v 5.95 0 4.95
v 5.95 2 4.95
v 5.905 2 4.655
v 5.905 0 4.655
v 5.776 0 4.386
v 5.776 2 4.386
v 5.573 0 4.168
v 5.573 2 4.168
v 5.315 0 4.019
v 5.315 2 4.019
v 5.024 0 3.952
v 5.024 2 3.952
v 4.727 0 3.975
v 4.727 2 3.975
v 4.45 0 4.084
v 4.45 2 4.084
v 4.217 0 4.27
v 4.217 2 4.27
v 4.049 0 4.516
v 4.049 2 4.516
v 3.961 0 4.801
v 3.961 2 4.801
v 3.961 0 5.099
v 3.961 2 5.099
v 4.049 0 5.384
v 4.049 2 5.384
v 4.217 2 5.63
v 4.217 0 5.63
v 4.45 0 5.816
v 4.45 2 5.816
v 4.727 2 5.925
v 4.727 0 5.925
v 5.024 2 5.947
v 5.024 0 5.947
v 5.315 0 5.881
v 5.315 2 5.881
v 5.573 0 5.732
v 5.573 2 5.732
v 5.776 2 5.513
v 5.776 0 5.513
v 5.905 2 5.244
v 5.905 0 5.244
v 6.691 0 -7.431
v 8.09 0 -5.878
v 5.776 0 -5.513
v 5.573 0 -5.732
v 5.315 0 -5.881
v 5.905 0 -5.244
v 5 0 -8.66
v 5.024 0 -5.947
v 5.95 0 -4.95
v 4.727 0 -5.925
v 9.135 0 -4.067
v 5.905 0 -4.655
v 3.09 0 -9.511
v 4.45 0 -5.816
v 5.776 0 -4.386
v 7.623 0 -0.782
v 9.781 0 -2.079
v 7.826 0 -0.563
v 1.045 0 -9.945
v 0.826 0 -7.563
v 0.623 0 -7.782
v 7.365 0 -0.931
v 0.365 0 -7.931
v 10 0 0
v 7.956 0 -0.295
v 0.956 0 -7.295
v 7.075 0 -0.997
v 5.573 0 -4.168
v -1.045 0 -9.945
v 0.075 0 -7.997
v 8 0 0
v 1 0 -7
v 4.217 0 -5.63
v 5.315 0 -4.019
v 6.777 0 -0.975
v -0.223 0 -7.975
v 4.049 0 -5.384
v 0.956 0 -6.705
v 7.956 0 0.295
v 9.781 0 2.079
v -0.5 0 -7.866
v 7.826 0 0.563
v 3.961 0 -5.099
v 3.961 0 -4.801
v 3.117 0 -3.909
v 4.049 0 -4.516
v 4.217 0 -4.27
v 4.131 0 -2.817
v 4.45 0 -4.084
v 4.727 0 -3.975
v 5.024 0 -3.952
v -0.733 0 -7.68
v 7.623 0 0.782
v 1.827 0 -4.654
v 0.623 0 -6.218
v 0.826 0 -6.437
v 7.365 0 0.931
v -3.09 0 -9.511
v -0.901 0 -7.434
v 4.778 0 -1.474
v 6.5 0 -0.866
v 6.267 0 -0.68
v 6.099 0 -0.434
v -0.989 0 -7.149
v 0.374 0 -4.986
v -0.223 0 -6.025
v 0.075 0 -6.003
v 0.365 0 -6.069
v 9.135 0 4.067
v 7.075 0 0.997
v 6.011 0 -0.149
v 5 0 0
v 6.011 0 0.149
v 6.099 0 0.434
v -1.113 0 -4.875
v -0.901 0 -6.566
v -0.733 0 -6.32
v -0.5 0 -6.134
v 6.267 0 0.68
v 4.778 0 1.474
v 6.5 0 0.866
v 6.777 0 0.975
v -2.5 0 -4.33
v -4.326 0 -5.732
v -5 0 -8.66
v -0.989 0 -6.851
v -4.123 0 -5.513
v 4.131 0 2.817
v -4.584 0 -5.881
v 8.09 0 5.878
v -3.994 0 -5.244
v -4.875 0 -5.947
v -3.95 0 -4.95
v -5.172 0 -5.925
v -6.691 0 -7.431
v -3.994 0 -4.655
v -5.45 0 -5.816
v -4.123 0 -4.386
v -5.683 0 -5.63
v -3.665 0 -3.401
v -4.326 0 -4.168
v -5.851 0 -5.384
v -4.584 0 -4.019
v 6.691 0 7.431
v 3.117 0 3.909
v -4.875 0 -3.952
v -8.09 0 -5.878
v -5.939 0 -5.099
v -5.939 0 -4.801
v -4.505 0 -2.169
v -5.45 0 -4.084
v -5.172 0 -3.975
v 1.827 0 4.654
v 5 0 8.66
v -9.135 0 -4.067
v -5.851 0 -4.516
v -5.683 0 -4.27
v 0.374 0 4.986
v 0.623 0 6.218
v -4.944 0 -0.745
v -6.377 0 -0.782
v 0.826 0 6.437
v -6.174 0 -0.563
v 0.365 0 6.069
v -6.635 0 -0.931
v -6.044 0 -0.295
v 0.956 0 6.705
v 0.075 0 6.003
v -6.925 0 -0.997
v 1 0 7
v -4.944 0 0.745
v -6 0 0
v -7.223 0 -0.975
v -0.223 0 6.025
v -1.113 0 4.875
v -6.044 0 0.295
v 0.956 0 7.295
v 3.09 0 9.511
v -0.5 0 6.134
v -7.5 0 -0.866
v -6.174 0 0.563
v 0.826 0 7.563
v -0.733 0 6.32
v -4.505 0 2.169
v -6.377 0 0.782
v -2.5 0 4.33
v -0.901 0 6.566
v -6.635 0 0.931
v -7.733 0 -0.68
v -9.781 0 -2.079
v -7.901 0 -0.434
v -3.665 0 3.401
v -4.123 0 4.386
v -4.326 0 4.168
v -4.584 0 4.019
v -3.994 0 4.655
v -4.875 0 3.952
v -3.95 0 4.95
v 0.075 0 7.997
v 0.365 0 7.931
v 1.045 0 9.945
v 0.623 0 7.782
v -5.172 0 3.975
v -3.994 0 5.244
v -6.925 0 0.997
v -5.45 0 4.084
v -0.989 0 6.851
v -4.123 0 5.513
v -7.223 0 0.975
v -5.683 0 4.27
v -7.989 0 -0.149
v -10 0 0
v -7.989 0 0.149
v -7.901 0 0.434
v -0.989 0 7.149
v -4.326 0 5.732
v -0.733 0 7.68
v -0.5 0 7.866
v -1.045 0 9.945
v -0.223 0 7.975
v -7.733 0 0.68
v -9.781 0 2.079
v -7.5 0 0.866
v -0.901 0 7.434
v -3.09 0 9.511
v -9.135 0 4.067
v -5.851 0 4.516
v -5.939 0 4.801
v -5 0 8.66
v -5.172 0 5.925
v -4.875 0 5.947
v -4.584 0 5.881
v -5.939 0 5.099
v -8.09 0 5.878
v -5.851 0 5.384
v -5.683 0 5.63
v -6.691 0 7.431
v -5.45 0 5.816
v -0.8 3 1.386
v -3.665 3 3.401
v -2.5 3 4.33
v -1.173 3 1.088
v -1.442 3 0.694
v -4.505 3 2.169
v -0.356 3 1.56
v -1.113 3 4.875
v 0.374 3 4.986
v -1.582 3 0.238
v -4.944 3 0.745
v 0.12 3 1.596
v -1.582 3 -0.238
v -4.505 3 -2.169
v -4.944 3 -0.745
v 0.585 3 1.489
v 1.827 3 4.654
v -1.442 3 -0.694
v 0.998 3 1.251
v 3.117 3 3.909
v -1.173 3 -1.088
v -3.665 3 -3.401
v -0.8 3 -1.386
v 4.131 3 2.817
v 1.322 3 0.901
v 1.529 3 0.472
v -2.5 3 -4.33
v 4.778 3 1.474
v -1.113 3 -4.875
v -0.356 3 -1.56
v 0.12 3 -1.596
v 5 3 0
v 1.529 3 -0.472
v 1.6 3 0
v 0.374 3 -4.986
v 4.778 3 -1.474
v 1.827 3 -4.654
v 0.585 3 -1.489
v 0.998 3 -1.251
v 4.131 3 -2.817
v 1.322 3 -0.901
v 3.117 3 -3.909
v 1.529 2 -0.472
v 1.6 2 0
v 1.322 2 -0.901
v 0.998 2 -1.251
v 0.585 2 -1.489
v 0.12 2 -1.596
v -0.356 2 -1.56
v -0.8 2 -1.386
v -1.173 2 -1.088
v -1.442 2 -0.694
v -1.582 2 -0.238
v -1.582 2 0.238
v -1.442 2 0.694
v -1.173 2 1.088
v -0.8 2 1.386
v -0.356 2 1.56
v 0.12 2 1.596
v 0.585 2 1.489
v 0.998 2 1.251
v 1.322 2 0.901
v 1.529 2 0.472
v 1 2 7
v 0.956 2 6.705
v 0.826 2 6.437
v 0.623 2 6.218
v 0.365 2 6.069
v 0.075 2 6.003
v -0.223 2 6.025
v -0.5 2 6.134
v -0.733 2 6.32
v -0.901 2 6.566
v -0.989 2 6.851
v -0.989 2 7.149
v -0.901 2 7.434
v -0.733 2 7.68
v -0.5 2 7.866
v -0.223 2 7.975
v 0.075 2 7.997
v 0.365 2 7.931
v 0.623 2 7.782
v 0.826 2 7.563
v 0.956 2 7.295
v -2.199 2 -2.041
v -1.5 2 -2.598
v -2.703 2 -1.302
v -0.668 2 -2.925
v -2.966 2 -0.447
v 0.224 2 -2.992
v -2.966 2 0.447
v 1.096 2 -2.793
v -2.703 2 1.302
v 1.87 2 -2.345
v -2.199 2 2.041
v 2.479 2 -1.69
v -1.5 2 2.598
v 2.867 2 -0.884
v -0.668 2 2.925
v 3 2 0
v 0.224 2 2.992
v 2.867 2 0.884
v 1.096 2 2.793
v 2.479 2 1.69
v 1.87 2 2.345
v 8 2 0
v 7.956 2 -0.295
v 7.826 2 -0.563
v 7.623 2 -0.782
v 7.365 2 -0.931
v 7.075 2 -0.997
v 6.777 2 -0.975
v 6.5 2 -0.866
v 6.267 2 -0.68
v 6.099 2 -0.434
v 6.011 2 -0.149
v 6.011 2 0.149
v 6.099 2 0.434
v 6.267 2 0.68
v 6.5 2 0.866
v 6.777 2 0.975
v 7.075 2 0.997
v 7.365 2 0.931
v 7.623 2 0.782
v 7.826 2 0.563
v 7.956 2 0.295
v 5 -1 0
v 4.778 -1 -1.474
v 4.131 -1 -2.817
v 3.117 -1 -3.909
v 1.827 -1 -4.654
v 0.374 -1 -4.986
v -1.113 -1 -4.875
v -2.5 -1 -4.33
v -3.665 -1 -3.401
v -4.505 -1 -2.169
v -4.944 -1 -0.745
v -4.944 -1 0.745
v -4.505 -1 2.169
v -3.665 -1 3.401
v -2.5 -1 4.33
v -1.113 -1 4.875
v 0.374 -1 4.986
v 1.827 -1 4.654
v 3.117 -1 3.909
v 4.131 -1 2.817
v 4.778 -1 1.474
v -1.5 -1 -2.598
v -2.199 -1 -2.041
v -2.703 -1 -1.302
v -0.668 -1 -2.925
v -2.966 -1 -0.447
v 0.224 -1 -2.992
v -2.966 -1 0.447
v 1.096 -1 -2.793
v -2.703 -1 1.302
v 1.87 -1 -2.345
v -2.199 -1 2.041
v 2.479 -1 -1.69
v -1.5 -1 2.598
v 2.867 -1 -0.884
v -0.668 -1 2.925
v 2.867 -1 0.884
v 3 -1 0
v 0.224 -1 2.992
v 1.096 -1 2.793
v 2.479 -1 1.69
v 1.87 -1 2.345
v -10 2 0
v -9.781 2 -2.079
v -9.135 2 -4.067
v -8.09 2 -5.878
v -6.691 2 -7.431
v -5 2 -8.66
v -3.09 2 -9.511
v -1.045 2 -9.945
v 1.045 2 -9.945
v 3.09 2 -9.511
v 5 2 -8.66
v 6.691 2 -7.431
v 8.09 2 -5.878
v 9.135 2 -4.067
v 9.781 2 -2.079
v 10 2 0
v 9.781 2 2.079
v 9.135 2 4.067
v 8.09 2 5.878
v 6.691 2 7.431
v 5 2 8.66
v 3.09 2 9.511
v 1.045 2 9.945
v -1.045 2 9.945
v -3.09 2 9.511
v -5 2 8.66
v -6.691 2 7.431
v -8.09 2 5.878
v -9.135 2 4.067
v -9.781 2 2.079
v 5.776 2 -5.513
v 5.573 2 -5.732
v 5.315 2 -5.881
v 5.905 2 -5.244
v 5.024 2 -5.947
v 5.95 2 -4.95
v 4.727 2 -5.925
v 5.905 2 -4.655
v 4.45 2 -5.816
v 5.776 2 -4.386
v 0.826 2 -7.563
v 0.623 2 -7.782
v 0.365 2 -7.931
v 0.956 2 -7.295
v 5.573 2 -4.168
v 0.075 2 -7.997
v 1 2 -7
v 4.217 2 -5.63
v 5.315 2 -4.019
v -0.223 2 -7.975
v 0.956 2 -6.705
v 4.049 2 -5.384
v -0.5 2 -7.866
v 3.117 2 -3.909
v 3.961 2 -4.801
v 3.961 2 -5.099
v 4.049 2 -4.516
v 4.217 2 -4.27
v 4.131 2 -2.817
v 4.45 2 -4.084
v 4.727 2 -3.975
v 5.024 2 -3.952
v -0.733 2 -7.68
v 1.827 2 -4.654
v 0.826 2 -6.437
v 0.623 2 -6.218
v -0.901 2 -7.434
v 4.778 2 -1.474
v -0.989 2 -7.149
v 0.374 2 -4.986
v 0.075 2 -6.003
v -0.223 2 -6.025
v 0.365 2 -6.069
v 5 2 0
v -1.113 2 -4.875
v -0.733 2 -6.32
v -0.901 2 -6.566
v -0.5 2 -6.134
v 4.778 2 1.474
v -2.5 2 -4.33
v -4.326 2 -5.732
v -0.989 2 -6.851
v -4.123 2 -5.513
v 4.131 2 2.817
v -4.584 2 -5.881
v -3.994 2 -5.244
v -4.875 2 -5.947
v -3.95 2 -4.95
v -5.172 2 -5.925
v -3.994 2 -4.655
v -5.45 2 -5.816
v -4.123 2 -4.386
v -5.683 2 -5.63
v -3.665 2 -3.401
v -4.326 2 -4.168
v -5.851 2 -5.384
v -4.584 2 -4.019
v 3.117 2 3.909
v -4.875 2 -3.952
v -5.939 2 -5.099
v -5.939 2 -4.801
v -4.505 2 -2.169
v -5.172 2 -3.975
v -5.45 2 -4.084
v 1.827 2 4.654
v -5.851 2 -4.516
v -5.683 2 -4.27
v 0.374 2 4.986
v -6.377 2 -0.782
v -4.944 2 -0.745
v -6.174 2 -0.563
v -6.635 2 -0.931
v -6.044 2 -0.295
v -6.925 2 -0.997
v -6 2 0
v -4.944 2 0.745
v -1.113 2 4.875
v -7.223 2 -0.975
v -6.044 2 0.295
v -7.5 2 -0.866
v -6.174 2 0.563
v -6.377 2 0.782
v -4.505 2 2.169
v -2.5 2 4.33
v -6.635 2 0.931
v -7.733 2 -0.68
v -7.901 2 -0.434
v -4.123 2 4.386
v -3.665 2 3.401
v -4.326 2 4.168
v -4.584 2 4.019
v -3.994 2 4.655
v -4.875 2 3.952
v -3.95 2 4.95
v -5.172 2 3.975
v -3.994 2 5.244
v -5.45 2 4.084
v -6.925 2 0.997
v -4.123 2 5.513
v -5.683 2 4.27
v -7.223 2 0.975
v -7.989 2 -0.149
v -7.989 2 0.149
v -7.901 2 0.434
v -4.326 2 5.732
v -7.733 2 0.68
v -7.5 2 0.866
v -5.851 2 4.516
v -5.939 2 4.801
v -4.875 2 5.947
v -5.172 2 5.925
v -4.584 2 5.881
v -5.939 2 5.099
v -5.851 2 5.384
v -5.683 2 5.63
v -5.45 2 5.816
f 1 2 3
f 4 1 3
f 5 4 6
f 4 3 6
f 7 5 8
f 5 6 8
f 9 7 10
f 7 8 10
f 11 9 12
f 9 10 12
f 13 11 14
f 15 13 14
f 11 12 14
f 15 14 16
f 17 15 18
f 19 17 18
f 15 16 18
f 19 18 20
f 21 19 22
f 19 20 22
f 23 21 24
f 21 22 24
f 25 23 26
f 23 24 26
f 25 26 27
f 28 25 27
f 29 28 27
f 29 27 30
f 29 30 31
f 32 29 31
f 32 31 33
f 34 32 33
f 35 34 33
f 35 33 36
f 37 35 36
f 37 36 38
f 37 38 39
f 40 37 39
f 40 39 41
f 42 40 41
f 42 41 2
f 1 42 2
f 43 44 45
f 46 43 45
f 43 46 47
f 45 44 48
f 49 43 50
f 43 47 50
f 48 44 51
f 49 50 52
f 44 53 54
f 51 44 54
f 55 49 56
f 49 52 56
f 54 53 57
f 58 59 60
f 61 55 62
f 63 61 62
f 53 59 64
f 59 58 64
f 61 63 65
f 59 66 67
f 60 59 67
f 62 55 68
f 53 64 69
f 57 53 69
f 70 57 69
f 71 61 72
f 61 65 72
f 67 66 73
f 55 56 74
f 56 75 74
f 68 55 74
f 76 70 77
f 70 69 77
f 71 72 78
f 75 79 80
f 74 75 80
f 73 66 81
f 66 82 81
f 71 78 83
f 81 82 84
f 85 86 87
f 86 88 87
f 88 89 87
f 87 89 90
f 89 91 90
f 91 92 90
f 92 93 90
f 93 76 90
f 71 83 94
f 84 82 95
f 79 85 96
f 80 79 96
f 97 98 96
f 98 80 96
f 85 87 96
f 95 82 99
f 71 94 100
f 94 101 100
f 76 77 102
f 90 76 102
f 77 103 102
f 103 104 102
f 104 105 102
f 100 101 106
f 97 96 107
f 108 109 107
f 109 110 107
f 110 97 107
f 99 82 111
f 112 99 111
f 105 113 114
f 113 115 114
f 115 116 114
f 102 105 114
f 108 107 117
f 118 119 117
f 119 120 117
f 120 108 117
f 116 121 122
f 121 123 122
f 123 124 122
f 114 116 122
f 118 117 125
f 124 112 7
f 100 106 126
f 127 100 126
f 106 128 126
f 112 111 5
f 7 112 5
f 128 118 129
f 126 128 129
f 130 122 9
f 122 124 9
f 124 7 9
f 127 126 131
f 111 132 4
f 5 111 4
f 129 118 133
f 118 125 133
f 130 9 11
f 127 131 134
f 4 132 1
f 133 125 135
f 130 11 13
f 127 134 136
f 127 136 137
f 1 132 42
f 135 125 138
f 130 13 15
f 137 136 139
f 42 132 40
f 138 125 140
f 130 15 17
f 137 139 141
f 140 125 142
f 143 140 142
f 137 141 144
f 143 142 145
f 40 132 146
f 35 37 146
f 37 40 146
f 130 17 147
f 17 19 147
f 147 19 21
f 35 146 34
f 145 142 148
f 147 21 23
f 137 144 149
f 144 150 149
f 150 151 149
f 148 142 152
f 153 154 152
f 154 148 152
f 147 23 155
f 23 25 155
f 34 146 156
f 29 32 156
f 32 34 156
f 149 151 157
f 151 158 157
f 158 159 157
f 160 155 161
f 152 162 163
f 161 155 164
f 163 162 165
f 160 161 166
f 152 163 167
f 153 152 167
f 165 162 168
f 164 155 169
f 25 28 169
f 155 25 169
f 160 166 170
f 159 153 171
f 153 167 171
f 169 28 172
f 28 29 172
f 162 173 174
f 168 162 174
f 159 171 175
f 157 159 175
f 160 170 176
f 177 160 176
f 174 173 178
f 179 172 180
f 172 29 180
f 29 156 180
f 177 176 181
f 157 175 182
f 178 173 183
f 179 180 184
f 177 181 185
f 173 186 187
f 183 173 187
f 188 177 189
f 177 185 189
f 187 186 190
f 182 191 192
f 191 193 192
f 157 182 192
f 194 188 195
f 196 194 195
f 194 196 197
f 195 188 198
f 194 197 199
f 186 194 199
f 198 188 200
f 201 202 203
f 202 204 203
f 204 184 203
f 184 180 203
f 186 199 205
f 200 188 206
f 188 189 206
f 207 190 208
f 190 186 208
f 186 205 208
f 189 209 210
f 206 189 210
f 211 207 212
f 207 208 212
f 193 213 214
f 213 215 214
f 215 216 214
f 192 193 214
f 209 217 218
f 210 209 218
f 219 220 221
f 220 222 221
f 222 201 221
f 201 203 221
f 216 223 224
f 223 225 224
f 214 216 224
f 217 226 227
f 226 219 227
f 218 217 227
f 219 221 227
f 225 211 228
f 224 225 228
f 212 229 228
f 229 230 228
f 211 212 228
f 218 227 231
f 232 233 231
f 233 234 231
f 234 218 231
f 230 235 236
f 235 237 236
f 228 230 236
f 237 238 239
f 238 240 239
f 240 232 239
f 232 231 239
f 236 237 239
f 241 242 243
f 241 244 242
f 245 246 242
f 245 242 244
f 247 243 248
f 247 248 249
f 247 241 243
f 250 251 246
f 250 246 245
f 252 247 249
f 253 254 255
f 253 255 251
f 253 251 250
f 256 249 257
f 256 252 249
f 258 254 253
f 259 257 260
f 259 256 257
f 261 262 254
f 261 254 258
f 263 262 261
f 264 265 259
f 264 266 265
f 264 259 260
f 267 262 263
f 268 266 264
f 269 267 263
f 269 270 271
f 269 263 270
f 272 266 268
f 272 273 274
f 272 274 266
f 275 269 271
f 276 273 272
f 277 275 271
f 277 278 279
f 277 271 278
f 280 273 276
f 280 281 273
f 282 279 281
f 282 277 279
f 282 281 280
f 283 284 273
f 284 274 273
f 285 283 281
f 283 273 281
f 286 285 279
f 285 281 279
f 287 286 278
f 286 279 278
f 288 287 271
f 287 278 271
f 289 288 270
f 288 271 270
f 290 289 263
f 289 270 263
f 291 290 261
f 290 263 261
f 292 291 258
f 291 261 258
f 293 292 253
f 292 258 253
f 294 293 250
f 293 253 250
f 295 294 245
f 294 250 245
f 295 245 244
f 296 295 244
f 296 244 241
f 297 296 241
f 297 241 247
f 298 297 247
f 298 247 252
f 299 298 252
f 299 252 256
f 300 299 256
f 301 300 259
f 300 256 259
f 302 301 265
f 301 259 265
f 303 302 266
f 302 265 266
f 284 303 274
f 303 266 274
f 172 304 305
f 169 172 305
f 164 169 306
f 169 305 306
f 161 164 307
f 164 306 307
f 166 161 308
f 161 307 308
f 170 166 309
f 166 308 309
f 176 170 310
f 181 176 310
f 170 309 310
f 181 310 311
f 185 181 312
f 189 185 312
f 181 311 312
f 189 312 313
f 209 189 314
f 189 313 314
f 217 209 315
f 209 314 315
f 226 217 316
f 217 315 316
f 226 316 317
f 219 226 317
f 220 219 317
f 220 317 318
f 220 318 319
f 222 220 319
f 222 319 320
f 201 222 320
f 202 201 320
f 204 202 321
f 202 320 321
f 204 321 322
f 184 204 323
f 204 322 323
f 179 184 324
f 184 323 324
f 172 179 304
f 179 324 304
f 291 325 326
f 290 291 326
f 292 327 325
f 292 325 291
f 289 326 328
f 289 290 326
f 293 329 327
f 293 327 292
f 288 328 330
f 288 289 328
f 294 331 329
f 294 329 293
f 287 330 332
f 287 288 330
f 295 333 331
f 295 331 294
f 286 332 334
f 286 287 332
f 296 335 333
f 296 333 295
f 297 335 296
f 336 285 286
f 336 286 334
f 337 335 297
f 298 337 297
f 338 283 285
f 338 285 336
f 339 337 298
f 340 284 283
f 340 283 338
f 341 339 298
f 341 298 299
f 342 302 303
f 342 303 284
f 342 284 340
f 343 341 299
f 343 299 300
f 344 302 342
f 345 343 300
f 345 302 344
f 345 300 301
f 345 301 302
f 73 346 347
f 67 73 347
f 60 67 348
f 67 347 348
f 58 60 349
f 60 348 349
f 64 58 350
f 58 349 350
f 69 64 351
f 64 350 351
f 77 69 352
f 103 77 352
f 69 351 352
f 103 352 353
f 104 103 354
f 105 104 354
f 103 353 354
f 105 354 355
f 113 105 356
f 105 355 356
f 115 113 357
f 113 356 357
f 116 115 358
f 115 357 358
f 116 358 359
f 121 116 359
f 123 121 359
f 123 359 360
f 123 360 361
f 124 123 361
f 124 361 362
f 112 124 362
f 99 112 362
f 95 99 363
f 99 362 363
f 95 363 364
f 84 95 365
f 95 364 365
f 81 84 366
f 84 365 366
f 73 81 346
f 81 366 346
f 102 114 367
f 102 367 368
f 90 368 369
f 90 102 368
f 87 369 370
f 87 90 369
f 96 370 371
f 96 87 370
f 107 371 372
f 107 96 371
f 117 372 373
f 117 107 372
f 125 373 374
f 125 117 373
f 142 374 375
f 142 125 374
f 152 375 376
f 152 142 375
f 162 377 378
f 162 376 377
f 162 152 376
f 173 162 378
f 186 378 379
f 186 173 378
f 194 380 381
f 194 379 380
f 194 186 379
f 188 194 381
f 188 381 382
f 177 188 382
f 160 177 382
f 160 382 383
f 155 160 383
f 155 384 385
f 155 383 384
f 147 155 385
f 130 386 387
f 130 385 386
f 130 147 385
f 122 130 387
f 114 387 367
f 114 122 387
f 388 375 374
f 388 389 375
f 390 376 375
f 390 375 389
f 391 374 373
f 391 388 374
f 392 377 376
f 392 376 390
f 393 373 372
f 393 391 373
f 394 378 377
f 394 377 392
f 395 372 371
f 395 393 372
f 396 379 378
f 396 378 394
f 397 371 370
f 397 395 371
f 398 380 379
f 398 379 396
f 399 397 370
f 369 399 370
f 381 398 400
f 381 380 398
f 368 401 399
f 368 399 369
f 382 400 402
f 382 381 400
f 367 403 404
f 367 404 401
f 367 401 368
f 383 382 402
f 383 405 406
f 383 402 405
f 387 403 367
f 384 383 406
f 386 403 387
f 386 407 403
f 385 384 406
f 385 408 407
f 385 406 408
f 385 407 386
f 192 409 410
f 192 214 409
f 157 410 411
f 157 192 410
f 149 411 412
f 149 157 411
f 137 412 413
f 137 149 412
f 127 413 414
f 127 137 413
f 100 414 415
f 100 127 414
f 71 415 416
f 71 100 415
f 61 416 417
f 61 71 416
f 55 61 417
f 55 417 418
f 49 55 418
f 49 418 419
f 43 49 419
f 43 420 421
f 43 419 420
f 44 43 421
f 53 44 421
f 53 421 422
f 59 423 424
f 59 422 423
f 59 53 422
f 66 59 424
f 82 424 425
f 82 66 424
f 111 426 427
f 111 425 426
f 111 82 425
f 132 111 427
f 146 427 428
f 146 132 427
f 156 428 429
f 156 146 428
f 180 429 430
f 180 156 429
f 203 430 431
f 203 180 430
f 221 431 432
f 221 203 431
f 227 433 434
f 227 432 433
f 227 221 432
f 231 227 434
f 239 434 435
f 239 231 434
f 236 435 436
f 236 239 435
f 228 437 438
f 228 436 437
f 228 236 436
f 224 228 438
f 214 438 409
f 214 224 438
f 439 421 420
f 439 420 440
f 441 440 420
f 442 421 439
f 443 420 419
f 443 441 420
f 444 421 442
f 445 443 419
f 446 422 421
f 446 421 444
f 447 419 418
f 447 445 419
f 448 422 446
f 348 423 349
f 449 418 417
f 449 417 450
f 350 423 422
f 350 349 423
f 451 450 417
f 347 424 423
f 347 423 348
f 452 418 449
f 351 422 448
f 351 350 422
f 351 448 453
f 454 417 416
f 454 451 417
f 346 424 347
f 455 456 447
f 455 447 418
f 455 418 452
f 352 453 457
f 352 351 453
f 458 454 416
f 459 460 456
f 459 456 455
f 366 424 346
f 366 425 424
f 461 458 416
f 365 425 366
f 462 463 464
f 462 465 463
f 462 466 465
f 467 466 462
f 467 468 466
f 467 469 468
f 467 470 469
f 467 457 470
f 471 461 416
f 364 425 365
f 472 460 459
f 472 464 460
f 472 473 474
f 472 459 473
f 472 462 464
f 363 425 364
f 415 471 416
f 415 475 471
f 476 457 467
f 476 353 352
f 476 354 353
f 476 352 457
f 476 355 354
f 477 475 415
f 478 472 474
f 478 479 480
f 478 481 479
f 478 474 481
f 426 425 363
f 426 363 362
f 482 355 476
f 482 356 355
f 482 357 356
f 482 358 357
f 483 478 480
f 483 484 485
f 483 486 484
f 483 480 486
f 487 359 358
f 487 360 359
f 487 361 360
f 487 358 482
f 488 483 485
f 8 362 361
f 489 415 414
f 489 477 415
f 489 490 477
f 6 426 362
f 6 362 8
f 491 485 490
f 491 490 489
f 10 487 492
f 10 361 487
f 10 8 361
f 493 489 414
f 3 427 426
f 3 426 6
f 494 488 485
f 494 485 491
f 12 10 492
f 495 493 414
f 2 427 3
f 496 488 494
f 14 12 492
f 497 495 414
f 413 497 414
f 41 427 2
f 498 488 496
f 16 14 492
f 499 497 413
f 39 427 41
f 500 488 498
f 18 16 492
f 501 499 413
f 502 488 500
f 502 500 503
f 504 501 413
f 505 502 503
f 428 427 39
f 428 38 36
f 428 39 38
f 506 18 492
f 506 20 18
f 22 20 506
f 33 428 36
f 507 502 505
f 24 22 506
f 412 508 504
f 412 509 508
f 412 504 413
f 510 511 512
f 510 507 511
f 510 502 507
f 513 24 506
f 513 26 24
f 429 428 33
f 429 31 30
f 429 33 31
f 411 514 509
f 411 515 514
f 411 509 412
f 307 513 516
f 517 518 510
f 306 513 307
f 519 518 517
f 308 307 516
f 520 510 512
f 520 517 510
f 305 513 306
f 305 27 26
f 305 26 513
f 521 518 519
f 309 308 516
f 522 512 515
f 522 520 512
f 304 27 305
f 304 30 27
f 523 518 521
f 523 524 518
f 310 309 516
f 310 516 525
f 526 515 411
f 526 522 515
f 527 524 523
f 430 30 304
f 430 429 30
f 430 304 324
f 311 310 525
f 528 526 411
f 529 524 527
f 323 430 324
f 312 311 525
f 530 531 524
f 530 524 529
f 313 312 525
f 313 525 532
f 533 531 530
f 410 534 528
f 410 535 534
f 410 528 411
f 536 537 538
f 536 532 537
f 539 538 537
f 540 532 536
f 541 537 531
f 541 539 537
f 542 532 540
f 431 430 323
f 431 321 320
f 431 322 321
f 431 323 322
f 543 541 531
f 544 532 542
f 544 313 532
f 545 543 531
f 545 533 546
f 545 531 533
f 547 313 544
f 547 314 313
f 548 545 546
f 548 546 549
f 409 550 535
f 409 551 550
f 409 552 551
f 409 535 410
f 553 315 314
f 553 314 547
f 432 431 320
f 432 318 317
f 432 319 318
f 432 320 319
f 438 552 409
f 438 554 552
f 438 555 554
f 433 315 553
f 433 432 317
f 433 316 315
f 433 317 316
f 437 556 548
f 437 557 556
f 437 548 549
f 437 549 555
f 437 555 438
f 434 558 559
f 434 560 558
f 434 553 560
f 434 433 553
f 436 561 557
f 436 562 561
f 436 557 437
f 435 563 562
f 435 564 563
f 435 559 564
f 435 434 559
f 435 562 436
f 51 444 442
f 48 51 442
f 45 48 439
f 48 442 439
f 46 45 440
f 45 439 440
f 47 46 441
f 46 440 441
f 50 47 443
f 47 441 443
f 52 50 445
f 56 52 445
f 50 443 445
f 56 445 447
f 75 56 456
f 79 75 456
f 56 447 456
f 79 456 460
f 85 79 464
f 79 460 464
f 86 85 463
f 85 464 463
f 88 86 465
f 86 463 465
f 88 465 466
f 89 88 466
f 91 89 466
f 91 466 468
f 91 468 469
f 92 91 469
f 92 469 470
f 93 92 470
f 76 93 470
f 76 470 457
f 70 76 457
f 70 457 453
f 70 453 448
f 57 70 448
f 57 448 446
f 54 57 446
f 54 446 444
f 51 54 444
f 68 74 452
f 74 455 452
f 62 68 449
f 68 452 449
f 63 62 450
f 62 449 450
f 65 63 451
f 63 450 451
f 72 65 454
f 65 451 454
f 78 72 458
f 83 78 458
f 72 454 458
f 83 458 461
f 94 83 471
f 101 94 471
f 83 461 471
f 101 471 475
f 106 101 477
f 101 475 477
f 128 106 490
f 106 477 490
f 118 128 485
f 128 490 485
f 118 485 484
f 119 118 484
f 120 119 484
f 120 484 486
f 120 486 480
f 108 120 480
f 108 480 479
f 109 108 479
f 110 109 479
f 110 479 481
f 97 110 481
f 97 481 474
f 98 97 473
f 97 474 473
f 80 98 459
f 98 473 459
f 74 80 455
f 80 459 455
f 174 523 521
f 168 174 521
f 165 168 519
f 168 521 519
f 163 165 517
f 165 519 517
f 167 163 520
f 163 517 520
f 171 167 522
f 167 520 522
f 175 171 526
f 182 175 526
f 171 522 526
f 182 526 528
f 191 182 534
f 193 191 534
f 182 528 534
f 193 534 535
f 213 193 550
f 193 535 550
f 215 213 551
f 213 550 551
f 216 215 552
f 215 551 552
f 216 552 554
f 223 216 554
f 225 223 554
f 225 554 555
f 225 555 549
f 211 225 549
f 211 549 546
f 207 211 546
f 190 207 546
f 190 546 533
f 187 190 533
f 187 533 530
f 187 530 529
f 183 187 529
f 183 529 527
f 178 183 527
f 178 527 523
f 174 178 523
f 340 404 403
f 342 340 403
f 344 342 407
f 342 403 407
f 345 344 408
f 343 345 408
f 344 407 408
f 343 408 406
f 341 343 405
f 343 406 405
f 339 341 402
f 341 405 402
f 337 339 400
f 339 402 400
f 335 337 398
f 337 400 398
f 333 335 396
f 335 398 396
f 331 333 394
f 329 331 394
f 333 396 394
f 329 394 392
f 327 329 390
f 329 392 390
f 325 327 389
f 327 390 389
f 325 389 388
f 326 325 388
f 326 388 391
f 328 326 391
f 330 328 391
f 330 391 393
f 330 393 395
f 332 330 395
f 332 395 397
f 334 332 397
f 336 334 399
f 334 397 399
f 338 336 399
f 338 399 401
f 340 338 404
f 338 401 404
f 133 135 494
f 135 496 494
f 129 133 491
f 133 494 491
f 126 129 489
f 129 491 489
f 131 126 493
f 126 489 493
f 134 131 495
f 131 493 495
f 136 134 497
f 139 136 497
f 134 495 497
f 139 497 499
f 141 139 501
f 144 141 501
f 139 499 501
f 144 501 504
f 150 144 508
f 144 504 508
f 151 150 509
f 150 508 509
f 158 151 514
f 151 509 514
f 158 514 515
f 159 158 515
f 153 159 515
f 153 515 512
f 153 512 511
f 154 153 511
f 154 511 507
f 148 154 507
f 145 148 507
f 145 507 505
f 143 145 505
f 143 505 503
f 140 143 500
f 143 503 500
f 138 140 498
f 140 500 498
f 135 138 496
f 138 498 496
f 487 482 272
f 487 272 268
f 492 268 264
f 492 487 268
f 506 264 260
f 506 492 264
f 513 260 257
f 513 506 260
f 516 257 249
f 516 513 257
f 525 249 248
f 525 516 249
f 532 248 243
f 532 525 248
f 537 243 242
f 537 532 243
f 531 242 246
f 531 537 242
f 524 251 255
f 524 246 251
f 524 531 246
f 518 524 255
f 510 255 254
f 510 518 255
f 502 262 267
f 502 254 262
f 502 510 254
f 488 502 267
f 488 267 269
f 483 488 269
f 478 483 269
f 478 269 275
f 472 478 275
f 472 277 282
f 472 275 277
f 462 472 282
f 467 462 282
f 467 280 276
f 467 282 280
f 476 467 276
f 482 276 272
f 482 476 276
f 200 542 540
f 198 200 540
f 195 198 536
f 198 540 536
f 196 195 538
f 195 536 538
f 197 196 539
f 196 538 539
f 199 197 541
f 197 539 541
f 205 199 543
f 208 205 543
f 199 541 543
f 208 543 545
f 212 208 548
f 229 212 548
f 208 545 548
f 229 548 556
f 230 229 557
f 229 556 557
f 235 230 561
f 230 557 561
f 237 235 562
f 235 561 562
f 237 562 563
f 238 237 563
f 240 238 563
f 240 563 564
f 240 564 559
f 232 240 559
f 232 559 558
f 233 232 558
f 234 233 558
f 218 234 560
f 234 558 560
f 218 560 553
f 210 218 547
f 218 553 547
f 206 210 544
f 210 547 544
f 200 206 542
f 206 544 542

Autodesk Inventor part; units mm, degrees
ref_plane "YZ Plane" through (0, 0, 0) normal (1, 0, 0) x (0, 1, 0)
ref_plane "XZ Plane" through (0, 0, 0) normal (0, 1, 0) x (-1, 0, 0)
ref_plane "XY Plane" through (0, 0, 0) normal (0, 0, 1) x (1, 0, 0)
sketch "スケッチ1" plane through (0, 0, 0) normal (0, 1, 0) x (-1, 0, 0)
  circle A0 centre (0, 0) radius 10
  dimension "d0" = 20
extrude "押し出し1" add sketch "スケッチ1" along normal blind 2
sketch "スケッチ2" plane through (0, 2, 0) normal (0, 1, 0) x (1, 0, 0)
  circle A0 centre (0, 0) radius 7 construction
  circle A1 centre (-7, 0) radius 1
  circle A2 centre (-4.9497, -4.9497) radius 1
  circle A3 centre (0, -7) radius 1
  circle A4 centre (4.9497, -4.9497) radius 1
  circle A5 centre (7, 0) radius 1
  circle A6 centre (4.9497, 4.9497) radius 1
  circle A7 centre (-4.9497, 4.9497) radius 1
  circle A8 centre (0, 7) radius 1
  dimension "d3" = 14
  dimension "d4" = 2
  dimension "d5" = 2
  dimension "d6" = 2
  dimension "d7" = 2
  dimension "d8" = 2
  dimension "d9" = 2
  dimension "d10" = 2
  dimension "d11" = 2
extrude "押し出し2" cut sketch "スケッチ2" against normal blind 2
sketch "スケッチ3" plane through (0, 2, 0) normal (0, 1, 0) x (1, 0, 0)
  circle A0 centre (0, 0) radius 5
  dimension "d14" = 10
extrude "押し出し3" add sketch "スケッチ3" along normal blind 1
sketch "スケッチ4" plane through (0, 3, 0) normal (0, 1, 0) x (1, 0, 0)
  circle A0 centre (0, 0) radius 1.6
  dimension "d17" = 3.2
extrude "押し出し4" cut sketch "スケッチ4" against normal blind 1
sketch "スケッチ5" plane through (0, 0, 0) normal (0, -1, 0) x (1, 0, 0)
  circle A0 centre (0, 0) radius 5
  dimension "d20" = 10
extrude "押し出し5" add sketch "スケッチ5" along normal blind 1
sketch "スケッチ6" plane through (0, -1, 0) normal (0, -1, 0) x (1, 0, 0)
  circle A0 centre (0, 0) radius 3
  dimension "d23" = 6
extrude "押し出し6" cut sketch "スケッチ6" against normal blind 3
properties part number "ServoHorn"
